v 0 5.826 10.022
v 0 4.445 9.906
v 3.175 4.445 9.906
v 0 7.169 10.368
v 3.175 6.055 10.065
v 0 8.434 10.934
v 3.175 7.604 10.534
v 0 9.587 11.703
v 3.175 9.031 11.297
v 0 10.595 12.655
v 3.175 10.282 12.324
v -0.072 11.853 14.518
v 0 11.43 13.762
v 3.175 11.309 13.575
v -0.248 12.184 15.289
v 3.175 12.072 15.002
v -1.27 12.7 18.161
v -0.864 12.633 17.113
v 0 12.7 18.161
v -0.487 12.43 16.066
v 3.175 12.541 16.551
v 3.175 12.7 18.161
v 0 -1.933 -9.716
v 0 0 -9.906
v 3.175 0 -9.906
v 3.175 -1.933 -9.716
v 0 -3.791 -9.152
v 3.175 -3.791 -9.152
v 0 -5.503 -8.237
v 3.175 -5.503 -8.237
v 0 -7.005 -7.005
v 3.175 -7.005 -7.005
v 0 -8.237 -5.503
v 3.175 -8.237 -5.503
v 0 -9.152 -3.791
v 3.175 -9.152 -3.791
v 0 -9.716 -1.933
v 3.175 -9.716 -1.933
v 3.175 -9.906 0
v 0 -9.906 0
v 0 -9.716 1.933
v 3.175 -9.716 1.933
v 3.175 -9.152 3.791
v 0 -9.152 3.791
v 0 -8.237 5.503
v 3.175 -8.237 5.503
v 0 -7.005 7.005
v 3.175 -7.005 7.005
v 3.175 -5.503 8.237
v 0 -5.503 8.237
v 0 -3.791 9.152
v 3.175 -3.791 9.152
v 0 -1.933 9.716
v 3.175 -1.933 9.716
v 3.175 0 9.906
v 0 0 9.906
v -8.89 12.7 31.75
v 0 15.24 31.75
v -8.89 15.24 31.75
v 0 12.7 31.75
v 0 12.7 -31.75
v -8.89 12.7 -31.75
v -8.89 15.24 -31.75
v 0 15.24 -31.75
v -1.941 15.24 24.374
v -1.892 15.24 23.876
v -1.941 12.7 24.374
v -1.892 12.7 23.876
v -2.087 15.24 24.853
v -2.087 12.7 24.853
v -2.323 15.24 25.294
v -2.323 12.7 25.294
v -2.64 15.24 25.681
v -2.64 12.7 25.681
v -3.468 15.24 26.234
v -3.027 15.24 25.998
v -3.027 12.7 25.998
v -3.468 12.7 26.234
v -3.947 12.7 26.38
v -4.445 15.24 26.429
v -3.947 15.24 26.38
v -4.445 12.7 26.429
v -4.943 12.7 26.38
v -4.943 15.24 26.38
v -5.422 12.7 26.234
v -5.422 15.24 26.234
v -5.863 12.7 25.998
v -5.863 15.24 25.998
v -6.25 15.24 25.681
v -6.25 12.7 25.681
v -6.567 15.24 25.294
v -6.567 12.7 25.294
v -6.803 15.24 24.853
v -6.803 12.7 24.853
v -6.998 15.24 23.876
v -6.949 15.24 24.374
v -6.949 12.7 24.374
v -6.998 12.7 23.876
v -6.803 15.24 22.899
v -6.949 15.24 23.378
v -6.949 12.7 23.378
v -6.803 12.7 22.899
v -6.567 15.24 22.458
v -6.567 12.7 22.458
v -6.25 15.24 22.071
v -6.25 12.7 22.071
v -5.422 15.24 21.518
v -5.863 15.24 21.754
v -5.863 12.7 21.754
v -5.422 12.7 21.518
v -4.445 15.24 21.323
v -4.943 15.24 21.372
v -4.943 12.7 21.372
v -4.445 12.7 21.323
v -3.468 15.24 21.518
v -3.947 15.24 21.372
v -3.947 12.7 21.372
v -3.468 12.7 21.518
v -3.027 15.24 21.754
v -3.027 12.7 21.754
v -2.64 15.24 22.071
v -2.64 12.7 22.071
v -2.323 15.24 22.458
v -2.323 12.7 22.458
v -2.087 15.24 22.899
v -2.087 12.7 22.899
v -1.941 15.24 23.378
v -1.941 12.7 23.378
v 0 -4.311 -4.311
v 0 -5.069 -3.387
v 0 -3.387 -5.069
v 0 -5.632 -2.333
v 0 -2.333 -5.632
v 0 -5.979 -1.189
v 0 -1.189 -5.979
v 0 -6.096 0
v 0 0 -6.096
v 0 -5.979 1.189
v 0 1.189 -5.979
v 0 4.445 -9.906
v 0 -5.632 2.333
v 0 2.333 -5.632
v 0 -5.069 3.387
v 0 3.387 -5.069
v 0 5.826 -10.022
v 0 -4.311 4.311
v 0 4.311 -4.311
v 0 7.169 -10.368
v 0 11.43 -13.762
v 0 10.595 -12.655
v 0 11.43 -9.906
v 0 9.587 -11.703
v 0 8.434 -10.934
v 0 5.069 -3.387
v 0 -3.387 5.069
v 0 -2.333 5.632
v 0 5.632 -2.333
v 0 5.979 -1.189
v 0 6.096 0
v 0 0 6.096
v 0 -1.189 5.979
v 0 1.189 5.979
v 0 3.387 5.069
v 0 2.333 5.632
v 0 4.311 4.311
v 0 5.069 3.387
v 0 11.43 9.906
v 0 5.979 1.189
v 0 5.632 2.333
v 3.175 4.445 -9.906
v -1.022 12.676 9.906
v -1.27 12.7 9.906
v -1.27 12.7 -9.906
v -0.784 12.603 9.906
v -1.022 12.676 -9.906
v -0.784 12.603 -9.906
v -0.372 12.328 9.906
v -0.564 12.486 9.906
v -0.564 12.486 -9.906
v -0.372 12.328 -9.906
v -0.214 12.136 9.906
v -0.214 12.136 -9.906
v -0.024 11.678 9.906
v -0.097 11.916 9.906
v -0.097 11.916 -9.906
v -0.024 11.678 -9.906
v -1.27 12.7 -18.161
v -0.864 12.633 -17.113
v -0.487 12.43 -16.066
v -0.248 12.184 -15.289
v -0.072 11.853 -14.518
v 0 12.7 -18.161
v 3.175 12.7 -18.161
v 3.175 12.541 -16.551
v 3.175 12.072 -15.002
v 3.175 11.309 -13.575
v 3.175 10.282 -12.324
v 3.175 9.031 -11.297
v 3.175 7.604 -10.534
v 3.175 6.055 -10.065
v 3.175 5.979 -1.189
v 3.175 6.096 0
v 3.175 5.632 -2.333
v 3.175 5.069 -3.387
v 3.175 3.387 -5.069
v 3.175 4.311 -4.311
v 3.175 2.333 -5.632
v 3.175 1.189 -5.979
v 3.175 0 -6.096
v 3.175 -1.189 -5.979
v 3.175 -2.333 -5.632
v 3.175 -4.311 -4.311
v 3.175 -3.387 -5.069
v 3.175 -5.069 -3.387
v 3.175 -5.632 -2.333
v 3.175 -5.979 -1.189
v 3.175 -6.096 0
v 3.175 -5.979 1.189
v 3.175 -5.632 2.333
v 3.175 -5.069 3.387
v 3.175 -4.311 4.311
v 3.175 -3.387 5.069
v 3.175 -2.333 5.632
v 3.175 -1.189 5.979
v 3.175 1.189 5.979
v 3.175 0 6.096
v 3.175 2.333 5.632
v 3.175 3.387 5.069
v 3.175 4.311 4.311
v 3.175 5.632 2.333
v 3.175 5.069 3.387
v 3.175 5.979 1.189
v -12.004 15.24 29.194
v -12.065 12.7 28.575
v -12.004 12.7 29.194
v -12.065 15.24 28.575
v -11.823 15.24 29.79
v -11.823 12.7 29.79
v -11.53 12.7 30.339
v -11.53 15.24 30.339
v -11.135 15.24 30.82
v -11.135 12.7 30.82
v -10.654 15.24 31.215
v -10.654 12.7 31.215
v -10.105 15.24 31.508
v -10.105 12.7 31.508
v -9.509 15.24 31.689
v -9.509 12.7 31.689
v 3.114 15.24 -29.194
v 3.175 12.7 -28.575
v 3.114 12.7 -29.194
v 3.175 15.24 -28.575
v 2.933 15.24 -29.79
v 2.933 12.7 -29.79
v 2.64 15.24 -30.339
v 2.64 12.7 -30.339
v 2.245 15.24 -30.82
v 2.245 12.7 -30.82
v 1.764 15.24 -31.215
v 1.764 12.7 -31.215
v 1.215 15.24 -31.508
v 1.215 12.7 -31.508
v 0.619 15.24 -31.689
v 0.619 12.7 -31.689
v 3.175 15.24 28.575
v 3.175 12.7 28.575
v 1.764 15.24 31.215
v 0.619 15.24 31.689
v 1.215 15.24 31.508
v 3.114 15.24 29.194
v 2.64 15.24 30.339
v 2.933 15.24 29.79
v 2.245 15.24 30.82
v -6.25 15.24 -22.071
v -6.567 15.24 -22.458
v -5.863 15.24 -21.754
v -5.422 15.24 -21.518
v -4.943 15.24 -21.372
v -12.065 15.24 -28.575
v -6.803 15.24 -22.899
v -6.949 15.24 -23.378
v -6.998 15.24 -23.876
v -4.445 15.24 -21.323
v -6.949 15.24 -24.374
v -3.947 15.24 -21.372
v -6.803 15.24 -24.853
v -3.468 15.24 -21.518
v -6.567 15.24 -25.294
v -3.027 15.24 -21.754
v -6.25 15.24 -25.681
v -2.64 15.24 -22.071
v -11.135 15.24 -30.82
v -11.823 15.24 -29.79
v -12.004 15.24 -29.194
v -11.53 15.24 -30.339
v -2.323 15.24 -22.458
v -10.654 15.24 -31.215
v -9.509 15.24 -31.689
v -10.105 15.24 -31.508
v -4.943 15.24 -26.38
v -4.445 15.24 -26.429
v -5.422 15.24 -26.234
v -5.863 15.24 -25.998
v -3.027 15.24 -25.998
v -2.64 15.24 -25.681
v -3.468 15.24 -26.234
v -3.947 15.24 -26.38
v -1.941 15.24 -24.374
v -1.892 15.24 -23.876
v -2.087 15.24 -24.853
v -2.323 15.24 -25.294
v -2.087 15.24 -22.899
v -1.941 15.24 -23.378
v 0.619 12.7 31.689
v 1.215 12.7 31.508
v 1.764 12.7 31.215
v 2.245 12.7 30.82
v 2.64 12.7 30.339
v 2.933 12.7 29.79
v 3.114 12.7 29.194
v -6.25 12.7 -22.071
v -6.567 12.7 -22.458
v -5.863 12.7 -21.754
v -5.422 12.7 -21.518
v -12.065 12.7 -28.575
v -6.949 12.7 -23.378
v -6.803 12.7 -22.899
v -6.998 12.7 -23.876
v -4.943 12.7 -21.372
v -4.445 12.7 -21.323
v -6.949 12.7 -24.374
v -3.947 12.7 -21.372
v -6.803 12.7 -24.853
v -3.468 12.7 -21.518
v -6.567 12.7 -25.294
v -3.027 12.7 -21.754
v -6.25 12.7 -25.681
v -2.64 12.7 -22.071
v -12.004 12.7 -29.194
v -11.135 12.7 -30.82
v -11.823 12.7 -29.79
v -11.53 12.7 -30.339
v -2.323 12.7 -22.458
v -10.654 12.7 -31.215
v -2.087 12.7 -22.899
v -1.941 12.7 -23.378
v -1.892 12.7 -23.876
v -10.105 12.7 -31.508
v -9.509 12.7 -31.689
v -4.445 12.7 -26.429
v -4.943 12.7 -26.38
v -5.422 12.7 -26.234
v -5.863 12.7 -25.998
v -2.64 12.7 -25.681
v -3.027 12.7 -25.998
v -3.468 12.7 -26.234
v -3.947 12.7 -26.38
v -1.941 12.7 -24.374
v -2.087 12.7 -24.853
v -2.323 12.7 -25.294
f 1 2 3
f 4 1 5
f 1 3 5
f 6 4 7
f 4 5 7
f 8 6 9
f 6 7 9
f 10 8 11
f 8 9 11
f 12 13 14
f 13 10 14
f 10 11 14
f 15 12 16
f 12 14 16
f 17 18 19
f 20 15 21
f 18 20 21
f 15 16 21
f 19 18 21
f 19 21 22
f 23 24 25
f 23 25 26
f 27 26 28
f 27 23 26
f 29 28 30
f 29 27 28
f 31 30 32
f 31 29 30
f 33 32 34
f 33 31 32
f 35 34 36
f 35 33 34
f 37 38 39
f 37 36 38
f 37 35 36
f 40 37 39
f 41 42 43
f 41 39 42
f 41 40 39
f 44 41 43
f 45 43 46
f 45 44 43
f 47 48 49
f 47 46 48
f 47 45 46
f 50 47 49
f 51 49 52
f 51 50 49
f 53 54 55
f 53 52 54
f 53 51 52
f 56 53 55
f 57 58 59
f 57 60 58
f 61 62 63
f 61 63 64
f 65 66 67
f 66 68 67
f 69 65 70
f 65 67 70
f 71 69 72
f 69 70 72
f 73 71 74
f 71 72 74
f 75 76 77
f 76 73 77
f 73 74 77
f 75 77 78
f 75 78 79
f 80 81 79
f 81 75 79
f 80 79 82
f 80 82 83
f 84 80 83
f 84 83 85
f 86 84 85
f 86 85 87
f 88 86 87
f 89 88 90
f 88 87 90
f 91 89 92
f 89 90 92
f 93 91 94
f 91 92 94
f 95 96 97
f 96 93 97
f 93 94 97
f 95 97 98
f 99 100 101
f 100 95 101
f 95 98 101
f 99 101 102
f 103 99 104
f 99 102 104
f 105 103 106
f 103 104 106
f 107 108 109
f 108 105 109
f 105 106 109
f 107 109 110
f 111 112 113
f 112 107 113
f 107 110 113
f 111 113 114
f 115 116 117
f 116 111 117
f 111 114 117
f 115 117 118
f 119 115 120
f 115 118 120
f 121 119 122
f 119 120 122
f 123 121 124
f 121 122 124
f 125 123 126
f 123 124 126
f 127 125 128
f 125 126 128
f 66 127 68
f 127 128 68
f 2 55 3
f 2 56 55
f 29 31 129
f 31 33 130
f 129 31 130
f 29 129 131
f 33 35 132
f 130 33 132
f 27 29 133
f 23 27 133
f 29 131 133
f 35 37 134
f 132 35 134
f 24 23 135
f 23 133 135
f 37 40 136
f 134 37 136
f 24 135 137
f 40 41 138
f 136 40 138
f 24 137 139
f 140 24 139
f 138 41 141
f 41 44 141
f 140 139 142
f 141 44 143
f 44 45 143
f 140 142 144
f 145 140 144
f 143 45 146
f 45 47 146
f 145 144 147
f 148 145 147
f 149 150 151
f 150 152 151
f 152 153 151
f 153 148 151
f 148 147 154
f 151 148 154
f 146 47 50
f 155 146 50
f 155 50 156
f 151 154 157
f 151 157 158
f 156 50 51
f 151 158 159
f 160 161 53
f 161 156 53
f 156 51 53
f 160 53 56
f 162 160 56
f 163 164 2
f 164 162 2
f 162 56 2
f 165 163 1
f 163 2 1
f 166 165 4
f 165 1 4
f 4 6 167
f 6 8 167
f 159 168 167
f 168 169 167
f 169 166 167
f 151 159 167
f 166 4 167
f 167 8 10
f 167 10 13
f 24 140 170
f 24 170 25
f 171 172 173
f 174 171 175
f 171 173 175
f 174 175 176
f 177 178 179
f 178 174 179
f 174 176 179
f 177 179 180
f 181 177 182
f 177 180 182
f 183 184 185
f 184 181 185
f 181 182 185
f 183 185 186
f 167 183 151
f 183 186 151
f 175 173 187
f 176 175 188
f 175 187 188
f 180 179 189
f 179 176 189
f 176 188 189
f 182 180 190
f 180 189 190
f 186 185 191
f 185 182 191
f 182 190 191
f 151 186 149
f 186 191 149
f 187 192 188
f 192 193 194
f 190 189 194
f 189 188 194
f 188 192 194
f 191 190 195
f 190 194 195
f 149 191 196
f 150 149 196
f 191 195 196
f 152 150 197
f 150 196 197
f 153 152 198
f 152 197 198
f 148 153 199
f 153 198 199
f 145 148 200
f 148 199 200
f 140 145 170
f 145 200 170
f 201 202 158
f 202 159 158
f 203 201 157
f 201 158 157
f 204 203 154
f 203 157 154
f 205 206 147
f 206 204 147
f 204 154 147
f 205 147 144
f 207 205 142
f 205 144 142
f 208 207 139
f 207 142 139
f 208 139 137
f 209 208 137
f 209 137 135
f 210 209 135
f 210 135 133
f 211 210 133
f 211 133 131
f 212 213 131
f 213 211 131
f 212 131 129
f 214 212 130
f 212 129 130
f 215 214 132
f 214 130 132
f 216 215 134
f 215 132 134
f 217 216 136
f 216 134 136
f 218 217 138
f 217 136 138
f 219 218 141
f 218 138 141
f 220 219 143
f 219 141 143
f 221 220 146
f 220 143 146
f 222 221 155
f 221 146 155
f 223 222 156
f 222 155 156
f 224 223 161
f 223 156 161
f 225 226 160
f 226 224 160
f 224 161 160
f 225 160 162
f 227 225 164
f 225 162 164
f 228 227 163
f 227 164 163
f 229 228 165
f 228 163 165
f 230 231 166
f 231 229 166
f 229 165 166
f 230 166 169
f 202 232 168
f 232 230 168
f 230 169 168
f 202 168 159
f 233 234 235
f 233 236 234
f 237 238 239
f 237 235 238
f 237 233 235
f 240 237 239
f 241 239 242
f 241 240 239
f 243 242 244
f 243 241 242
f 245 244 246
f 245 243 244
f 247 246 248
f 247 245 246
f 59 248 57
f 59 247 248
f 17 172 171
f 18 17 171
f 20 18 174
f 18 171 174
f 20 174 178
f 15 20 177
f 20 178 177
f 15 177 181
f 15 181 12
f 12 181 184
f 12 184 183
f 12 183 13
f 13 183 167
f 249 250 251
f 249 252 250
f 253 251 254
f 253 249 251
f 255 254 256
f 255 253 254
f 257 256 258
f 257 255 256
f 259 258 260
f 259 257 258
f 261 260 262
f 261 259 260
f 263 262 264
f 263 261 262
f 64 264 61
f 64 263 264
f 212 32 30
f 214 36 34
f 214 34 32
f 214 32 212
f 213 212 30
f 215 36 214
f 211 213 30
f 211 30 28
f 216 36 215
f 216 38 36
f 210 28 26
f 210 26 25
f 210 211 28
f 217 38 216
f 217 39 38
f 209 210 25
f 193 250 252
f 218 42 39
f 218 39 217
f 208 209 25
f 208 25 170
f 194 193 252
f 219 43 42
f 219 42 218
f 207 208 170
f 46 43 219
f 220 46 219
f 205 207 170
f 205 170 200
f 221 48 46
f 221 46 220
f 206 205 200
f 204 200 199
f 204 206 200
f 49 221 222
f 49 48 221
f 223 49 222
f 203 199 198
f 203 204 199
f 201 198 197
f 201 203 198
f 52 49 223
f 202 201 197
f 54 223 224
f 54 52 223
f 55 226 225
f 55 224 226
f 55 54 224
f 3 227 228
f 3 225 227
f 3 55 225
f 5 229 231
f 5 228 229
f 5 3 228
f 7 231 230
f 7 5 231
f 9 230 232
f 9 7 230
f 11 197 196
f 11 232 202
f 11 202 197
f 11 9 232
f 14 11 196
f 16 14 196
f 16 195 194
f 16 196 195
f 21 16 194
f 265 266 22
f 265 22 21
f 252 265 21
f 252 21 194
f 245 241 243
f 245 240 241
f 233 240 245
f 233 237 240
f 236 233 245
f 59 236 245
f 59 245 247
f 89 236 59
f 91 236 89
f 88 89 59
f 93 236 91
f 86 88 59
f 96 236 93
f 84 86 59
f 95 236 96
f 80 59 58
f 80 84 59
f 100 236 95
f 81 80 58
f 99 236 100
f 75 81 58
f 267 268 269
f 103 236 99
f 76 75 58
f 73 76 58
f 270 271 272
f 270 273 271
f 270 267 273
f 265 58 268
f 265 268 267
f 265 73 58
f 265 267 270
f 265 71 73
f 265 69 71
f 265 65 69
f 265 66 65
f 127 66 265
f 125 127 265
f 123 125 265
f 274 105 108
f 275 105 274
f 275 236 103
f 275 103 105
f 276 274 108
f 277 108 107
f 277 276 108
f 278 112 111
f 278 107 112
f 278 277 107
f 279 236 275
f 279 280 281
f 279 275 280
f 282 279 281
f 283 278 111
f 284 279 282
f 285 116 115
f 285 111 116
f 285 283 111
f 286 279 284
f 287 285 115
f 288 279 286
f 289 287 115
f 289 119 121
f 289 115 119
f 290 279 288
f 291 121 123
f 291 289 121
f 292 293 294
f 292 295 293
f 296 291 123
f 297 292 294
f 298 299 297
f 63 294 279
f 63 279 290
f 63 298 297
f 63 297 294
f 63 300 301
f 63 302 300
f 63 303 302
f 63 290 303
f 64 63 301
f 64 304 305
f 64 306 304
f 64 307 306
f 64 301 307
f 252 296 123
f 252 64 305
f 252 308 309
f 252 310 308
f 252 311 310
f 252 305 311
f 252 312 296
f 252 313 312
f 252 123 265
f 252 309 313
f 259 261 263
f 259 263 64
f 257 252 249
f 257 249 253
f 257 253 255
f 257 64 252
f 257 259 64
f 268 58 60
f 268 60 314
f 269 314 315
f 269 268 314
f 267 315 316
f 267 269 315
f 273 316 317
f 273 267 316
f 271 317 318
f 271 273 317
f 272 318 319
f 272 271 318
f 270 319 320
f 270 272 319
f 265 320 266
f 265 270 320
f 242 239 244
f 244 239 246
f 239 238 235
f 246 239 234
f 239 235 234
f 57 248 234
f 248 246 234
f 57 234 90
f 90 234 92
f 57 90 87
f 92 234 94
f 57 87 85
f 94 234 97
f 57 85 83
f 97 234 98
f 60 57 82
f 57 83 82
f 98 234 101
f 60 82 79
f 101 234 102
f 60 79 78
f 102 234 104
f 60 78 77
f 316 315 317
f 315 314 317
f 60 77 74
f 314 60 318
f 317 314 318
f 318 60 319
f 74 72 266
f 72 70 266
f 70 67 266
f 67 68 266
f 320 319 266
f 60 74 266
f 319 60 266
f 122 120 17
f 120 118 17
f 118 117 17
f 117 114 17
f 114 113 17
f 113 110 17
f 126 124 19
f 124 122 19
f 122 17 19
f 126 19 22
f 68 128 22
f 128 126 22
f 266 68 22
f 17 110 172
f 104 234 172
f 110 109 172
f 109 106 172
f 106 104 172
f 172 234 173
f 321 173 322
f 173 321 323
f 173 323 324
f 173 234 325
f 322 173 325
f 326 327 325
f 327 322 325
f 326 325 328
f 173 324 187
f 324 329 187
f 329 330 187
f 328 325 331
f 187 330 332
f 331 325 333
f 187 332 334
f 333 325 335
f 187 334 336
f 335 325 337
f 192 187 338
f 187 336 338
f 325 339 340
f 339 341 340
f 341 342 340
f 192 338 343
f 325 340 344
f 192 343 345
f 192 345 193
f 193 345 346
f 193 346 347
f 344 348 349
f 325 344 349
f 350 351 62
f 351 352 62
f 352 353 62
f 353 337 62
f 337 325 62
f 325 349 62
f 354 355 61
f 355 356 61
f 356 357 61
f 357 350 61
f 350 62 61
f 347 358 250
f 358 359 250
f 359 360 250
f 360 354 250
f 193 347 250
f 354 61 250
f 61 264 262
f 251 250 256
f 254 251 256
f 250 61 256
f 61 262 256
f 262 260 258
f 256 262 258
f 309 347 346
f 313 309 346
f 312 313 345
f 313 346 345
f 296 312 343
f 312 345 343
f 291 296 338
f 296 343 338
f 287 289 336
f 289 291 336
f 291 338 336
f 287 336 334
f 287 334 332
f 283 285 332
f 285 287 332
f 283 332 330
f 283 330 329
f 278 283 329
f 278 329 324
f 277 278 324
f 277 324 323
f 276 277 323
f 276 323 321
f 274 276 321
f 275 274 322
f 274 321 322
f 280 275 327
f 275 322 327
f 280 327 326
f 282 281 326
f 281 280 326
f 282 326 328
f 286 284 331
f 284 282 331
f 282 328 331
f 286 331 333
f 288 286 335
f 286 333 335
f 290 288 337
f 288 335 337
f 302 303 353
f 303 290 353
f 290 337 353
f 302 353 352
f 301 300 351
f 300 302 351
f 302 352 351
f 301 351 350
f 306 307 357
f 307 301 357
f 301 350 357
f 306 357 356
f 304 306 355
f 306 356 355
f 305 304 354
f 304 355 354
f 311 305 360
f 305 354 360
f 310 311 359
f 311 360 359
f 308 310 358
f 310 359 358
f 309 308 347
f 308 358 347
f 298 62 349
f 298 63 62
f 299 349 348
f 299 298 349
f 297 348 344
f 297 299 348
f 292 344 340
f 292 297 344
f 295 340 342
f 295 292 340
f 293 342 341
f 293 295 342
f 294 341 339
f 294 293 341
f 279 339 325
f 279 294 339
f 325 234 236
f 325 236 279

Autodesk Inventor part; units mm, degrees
ref_plane "YZ Plane" through (0, 0, 0) normal (1, 0, 0) x (0, 1, 0)
ref_plane "XZ Plane" through (0, 0, 0) normal (0, 1, 0) x (-1, 0, 0)
ref_plane "XY Plane" through (0, 0, 0) normal (0, 0, 1) x (1, 0, 0)
sketch "Sketch1" plane through (0, 0, 0) normal (1, 0, 0) x (0, 1, 0)
  circle A0 centre (0, 0) radius 6.096
  arc A1 (0, 9.906) -> (0, -9.906) centre (0, 0) ccw
  line L0 (0, 9.906) -> (12.7, 9.906)
  line L1 (12.7, 9.906) -> (12.7, -9.906)
  line L2 (12.7, -9.906) -> (0, -9.906)
  arc A2 (0, -9.906) -> (0, 9.906) centre (0, 0) ccw construction
  dimension "d0" = 12.192
  dimension "d1" = 3.81
  dimension "d2" = 12.7
extrude "Extrusion1" add sketch "Sketch1" along normal blind 3.175
sketch "Sketch3" plane through (0, 12.7, 9.906) normal (0, 1, 0) x (1, 0, 0)
  line L0 (-12.065, 41.656) -> (3.175, 41.656)
  line L1 (3.175, 41.656) -> (3.175, -21.844)
  line L2 (3.175, -21.844) -> (-12.065, -21.844)
  line L3 (-12.065, -21.844) -> (-12.065, 41.656)
  line L4 (3.175, 19.812) -> (3.175, 0) projected
  circle A0 centre (-4.445, 33.782) radius 2.5527
  circle A1 centre (-4.445, -13.97) radius 2.5527
  line L5 (-12.065, 9.906) -> (3.175, 9.906) construction
  point P0 (0, 9.906)
  dimension "d6" = 63.5
  dimension "d7" = 15.24
  dimension "d8" = 5.1054
  dimension "d9" = 47.752
  dimension "d10" = 7.62
extrude "Extrusion2" add sketch "Sketch3" along normal blind 2.54
fillet "Fillet1" radius 8.255 2 edges at (1.5875, 12.7, -9.906) (1.5875, 12.7, 9.906)
fillet "Fillet2" radius 1.27 1 edges at (0, 12.7, 0)
fillet "Fillet3" radius 3.175 4 edges at (-12.065, 13.97, -31.75) (3.175, 13.97, -31.75) (3.175, 13.97, 31.75) (-12.065, 13.97, 31.75)
properties part number "ToggleSwitchBracket"
